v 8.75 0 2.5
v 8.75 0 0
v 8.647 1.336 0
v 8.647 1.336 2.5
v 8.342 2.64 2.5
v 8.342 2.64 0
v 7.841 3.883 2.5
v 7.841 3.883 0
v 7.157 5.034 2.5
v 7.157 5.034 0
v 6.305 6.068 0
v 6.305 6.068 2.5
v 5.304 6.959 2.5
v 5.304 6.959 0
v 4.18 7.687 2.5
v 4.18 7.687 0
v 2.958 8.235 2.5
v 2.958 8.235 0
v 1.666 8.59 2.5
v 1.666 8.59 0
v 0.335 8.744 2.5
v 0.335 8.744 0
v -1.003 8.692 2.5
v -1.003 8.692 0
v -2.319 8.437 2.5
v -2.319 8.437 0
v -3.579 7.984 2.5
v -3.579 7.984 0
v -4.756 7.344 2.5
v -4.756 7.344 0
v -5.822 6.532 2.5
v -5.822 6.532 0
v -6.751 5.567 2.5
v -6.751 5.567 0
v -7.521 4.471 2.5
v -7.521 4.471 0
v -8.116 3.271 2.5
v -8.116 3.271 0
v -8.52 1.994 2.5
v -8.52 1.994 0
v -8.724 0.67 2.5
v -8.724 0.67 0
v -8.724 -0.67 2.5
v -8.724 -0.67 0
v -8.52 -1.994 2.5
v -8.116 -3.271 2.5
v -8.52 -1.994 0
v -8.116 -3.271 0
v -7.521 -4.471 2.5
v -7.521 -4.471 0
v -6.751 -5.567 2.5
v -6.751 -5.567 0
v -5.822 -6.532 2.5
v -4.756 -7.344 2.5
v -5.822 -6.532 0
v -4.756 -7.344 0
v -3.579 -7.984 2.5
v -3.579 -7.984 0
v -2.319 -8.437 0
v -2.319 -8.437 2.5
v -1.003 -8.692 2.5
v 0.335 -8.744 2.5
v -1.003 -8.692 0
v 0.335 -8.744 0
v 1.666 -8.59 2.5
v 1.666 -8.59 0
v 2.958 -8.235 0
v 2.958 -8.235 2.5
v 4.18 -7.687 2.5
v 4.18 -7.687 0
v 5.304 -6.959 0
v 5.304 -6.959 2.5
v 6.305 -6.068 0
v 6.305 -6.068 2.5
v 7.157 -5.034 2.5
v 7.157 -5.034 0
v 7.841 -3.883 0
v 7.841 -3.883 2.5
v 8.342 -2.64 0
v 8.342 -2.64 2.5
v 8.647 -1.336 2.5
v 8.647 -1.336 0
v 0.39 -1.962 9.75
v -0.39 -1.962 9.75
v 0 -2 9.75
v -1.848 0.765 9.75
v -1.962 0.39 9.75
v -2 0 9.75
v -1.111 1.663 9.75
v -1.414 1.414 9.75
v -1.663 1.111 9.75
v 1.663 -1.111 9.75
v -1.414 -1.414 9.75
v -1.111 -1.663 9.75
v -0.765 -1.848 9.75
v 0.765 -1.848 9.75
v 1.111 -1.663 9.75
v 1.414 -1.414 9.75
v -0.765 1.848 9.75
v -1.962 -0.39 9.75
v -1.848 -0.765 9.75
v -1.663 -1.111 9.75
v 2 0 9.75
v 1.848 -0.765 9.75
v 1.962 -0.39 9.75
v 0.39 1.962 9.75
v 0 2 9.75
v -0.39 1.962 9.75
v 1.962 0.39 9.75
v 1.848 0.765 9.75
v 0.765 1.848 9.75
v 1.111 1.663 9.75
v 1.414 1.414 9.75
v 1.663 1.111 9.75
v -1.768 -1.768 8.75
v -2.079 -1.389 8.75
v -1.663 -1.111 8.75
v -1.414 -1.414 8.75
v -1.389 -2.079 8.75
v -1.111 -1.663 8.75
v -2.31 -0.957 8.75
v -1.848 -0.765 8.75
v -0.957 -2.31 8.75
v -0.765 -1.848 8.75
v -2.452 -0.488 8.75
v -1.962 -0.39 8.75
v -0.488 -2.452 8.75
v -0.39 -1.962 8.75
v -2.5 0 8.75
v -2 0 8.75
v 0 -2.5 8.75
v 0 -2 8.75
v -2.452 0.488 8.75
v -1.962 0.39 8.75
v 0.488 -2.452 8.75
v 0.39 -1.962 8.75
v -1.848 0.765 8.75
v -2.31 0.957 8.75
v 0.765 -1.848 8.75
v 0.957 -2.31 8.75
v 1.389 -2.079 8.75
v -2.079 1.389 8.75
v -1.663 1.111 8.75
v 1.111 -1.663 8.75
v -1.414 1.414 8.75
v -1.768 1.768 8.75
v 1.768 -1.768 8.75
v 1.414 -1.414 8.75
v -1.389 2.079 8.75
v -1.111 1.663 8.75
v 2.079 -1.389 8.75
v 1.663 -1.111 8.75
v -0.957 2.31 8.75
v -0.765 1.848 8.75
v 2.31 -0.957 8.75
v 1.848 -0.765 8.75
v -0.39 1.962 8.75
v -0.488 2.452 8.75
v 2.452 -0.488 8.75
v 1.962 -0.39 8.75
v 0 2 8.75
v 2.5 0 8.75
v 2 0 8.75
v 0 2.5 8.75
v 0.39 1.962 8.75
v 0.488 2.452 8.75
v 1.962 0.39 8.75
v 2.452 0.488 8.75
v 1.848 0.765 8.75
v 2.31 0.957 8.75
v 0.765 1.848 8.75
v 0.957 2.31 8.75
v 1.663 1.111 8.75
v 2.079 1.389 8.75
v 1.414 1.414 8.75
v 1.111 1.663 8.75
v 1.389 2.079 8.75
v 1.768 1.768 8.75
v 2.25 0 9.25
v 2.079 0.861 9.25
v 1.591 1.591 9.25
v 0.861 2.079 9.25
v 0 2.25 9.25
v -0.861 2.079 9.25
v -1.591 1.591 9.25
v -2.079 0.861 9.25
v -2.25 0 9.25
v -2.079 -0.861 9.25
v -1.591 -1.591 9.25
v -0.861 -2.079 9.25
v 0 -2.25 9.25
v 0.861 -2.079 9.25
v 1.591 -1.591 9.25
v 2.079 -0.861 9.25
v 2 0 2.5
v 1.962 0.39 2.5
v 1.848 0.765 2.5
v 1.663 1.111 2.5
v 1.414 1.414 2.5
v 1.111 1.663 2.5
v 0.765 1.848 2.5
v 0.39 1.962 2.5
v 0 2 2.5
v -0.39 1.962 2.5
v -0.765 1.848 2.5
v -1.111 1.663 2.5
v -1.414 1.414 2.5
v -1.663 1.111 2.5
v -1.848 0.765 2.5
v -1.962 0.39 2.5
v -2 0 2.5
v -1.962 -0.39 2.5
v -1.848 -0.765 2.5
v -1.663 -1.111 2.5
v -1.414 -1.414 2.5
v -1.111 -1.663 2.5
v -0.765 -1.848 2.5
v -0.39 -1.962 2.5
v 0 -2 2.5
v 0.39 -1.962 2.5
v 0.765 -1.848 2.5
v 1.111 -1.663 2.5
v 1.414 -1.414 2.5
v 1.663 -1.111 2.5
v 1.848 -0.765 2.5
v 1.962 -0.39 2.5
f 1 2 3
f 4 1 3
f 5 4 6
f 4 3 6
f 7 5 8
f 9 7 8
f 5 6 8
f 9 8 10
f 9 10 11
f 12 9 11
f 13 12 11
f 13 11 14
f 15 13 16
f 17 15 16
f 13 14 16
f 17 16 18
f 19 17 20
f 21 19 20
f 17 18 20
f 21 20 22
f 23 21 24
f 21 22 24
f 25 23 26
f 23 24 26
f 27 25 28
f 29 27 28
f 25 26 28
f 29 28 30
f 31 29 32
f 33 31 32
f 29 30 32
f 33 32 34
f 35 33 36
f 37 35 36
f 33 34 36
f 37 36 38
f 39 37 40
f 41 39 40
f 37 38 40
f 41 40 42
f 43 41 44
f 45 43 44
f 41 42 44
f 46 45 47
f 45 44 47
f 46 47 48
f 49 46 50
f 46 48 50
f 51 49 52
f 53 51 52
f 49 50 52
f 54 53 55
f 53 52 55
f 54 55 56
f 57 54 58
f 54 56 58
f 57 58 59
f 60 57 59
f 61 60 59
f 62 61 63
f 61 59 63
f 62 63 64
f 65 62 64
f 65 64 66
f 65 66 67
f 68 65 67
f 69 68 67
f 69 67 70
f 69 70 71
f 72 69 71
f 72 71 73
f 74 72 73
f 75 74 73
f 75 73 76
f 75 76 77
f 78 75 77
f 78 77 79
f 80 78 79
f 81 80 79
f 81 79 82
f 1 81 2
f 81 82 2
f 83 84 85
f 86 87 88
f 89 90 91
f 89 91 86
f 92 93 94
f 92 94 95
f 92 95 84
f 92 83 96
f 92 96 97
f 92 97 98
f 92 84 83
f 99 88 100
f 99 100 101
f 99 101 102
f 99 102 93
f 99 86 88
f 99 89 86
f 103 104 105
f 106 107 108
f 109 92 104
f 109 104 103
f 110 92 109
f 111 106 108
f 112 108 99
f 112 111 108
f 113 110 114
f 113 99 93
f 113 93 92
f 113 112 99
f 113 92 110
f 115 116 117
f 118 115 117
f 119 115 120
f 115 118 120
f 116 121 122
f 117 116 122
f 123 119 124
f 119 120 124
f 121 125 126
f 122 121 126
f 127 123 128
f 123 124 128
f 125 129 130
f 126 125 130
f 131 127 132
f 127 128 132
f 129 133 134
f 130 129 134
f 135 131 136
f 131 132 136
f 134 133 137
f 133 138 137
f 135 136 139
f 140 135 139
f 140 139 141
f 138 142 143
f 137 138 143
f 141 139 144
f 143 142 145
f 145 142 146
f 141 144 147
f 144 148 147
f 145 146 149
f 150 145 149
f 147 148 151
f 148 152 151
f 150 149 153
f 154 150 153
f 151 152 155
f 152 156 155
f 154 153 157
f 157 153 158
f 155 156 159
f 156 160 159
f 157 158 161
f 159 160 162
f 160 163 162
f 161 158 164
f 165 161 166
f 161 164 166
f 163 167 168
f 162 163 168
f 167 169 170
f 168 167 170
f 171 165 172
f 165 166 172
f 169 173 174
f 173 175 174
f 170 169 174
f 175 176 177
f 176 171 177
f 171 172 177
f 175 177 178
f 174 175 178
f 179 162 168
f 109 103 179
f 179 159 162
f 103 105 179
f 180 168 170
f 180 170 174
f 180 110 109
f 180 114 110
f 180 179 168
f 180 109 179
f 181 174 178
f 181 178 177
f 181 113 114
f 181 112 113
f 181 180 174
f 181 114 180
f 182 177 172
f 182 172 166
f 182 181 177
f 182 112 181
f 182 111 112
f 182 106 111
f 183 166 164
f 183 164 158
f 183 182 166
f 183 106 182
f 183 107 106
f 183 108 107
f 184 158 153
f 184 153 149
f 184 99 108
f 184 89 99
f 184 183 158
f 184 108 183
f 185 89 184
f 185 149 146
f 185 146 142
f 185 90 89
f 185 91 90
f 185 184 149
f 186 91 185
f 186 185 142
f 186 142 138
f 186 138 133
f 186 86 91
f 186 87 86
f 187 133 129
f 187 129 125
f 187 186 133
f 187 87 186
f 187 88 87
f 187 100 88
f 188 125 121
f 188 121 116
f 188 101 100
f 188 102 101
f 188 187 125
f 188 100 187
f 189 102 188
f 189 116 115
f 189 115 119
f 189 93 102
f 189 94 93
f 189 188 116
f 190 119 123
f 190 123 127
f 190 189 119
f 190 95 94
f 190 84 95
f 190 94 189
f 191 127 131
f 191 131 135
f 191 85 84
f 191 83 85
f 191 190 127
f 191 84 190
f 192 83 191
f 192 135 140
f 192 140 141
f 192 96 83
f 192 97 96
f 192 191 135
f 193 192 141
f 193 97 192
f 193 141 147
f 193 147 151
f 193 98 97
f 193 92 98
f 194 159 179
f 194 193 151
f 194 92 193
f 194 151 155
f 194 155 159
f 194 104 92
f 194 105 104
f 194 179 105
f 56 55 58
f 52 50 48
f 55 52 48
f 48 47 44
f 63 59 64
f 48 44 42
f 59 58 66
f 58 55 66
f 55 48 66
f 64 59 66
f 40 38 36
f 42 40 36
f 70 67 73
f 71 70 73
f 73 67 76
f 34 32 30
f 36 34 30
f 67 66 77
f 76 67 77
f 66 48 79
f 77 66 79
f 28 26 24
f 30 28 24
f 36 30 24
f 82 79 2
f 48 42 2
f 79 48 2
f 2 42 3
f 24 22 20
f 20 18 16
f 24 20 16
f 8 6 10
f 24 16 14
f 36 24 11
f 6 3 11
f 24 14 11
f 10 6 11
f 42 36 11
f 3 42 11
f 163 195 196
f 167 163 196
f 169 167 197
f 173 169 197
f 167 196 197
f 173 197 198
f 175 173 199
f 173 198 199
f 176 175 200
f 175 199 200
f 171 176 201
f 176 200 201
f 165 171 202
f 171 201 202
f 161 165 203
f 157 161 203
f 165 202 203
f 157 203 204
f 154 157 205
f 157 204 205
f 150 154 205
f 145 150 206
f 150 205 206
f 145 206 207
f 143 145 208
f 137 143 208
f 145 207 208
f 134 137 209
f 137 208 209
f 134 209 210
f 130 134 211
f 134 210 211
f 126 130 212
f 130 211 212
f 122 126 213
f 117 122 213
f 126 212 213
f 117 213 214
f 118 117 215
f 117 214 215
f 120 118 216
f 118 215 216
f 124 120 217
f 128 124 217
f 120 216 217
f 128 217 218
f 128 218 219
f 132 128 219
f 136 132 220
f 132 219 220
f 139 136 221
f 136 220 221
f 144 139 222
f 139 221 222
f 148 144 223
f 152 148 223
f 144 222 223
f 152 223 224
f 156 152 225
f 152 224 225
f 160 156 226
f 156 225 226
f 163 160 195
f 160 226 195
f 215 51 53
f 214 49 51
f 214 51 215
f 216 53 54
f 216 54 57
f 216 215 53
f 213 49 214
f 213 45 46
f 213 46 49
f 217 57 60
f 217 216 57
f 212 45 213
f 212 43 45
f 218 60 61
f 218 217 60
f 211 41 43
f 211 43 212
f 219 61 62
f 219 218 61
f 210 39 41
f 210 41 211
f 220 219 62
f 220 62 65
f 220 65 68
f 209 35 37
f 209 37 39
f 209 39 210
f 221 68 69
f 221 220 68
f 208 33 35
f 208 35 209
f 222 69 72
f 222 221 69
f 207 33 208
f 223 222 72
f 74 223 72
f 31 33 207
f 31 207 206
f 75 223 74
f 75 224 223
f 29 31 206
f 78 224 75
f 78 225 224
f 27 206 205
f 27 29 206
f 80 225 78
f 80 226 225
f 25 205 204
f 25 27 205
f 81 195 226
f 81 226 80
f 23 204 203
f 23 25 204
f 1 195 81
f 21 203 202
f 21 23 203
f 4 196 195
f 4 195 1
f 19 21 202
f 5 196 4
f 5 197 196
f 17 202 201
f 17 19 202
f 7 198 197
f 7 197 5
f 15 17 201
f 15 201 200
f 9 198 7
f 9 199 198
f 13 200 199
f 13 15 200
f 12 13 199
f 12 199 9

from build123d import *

# Parameters (mm, degrees)
F0_R     = 8.75
F1_DEPTH = 2.5
F2_R     = 2
F3_DEPTH = 6.25
F4_R     = 2.5
F6_R     = 2


with BuildPart() as f1:
    # F0 (on Top) → F1 (new body)
    with BuildSketch(Plane.XY):
        Circle(F0_R)
    extrude(amount=F1_DEPTH)

    # F2 (on face) → F3 (join)
    with BuildSketch(Plane.XY.offset(2.5)):
        Circle(F2_R)
    extrude(amount=F3_DEPTH)

    # F4 (on face) → F7 section 0
    with BuildSketch(Plane.XY.offset(8.75)):
        Circle(F4_R)
    # F6 (on offset) → F7 section 1
    with BuildSketch(Plane.XY.offset(9.75)):
        Circle(F6_R)
    loft()


solid = f1.part
